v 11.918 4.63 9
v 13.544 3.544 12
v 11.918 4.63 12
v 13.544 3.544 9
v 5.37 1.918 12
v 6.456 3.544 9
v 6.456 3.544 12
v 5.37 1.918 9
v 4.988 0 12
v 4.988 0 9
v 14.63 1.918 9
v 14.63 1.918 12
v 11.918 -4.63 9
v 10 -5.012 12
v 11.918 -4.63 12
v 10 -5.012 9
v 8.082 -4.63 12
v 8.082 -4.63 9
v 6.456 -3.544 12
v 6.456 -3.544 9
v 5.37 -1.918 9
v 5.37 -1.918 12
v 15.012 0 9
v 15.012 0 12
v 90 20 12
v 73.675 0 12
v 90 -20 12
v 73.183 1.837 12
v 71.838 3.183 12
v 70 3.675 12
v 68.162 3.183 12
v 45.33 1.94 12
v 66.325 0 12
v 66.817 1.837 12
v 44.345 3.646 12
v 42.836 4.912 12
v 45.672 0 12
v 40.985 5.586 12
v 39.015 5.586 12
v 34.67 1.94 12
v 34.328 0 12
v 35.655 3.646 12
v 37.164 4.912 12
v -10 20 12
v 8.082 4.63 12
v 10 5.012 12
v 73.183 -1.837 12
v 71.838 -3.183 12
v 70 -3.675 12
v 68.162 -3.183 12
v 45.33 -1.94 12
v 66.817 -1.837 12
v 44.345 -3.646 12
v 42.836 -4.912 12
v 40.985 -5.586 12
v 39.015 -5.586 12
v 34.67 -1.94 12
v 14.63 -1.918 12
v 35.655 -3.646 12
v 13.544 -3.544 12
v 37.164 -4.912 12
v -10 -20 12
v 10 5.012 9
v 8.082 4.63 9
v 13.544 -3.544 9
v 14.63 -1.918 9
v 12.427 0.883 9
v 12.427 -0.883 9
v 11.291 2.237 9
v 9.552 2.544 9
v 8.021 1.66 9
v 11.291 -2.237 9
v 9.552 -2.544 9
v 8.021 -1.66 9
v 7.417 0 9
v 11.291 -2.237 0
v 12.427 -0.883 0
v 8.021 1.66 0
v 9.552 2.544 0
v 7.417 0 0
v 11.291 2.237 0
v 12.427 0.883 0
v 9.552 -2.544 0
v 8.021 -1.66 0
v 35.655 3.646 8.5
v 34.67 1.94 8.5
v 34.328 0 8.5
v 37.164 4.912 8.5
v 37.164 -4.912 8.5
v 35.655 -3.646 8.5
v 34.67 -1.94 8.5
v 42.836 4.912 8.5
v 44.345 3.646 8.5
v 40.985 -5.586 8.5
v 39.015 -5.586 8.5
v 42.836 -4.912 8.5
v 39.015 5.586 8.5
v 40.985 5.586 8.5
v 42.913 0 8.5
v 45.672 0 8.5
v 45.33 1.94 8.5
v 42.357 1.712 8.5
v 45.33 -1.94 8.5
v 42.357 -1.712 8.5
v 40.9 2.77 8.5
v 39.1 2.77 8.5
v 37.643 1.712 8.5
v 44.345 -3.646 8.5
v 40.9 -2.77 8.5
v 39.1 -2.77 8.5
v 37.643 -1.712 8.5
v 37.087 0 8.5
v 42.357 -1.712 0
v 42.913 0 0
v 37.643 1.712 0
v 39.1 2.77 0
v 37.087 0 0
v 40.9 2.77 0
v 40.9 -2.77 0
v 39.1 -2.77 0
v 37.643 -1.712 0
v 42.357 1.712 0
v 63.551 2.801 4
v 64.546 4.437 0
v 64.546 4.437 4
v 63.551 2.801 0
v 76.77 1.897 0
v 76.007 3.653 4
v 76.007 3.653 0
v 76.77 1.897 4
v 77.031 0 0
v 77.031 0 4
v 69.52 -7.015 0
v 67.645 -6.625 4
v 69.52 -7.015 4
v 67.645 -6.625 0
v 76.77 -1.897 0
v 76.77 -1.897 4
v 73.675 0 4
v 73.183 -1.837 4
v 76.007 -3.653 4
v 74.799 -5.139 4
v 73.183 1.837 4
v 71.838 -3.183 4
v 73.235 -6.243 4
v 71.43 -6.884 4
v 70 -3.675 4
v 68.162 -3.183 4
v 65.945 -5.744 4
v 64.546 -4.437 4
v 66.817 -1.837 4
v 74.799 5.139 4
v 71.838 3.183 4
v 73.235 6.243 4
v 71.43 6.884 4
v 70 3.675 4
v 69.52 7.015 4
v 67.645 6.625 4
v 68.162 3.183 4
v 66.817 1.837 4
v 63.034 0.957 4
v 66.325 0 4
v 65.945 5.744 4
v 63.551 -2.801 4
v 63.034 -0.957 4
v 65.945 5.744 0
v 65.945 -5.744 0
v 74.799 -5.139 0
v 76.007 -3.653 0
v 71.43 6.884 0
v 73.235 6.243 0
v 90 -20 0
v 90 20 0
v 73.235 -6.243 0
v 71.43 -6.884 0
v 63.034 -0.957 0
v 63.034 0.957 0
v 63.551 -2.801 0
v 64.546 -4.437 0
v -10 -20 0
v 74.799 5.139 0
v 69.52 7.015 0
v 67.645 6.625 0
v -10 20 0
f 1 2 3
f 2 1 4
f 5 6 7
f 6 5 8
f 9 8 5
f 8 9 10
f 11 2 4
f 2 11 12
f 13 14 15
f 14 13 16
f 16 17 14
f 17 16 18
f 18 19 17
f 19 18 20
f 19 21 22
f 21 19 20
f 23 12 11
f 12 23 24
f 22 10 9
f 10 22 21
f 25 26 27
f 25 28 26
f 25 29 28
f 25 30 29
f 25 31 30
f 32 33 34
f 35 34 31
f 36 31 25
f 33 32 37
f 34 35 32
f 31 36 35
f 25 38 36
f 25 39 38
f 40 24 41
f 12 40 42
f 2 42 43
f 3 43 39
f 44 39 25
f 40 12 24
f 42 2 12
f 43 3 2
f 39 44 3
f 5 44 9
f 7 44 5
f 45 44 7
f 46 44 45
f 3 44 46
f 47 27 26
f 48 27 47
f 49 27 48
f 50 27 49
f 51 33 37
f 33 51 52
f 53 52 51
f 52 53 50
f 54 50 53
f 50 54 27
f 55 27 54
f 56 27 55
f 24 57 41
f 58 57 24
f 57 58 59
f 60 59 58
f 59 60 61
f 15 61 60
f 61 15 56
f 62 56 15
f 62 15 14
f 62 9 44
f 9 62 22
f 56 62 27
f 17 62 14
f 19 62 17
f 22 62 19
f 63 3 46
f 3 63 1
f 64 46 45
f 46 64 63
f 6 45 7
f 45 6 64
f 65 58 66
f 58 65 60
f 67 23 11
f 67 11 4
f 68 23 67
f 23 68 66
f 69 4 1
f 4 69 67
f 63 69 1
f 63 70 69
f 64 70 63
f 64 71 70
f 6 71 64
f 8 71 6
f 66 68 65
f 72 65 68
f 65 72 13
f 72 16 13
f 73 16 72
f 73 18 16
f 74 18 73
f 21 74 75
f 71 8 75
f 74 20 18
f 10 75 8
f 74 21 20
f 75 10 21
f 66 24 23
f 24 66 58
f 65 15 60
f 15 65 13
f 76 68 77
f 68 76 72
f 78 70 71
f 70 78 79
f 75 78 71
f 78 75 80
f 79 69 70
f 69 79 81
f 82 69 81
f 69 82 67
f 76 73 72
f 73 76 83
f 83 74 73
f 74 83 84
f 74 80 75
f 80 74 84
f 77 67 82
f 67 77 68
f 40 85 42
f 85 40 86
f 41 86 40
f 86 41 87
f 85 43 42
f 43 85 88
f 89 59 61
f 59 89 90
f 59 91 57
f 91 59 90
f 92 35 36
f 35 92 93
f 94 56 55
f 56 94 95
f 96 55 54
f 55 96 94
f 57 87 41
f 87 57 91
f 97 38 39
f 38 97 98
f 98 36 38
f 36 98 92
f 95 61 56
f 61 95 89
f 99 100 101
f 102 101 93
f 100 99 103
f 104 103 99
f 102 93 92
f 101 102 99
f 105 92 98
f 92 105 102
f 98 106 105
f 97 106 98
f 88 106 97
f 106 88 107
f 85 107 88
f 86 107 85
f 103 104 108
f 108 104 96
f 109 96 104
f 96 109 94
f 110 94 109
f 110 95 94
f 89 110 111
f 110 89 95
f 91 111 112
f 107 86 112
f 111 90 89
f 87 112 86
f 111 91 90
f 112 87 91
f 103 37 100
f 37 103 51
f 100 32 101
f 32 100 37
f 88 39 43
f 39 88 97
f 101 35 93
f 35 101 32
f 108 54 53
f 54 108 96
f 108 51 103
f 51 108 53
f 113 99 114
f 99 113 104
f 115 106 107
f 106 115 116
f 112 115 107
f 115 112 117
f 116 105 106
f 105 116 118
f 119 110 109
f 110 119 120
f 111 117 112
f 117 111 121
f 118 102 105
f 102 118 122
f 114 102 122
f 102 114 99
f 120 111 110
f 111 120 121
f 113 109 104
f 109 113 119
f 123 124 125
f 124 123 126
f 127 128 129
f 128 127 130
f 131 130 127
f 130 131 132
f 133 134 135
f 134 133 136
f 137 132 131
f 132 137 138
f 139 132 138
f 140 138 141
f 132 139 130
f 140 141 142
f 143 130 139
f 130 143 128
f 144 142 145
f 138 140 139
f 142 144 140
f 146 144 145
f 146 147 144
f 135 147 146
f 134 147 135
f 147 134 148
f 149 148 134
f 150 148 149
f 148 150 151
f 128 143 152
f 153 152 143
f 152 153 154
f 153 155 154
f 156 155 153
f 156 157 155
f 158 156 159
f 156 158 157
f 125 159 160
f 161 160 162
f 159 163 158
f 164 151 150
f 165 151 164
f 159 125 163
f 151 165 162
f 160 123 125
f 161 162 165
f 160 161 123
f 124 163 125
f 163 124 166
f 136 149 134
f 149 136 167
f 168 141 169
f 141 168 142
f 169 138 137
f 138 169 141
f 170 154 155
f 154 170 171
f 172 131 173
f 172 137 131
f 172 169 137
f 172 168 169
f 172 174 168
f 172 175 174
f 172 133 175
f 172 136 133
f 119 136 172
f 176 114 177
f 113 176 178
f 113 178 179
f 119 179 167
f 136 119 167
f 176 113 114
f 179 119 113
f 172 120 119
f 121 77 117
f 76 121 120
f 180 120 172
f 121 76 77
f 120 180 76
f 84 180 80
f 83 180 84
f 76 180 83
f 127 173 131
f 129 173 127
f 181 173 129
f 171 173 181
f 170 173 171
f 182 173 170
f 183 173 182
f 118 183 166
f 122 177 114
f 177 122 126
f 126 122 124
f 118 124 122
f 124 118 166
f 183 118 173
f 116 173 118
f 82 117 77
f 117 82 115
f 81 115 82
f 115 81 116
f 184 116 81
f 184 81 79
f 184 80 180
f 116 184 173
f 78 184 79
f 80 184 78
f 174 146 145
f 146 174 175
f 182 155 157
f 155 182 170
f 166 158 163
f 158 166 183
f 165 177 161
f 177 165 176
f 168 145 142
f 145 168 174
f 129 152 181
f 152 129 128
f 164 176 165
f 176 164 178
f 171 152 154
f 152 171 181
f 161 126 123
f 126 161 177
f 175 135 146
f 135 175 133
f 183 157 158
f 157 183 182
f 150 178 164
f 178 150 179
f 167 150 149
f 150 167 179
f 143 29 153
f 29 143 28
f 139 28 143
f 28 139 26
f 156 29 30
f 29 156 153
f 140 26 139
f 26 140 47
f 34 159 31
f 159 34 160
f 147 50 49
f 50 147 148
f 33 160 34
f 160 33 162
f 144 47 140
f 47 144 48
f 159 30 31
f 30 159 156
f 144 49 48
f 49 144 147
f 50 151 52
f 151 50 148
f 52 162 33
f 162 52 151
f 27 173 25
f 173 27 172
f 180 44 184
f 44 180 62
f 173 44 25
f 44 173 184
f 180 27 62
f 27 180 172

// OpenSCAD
// =====================================================
// CALCULADORA DE AVELLANADO - TORNILLOS AMERICANOS
// (Flat Head Wood Screws, numeración ANSI/ASME B18.6.1)
// El diámetro de rosca se ingresa como N° de calibre
// USA (Wood Screw Gauge) o en pulgadas decimales
// Versión cilindro recto - DEMO 3D
// =====================================================
// NOTA: los tornillos de madera americanos se especifican
// por NÚMERO DE CALIBRE (#4, #6, #8, #10, #12) y no por
// diámetro directo como en métrico. A partir de 1/4" ya
// se especifican en pulgadas normales.
// Valores de cabeza (DK, K) tomados de tablas de referencia
// de flat head wood screws - verificar contra fabricante
// si es para producción crítica.
// =====================================================

PULGADA_AM = 25.4;
function pulg_a_mm_am(p) = p * PULGADA_AM;

// -----------------------------------------------------
// Diámetro de vástago (shank) según N° de calibre USA
// (en pulgadas decimales)
// -----------------------------------------------------
function diametro_calibre(numero) =
    numero == 2  ? 0.086 :
    numero == 3  ? 0.099 :
    numero == 4  ? 0.112 :
    numero == 5  ? 0.125 :
    numero == 6  ? 0.138 :
    numero == 7  ? 0.151 :
    numero == 8  ? 0.164 :
    numero == 9  ? 0.177 :
    numero == 10 ? 0.190 :
    numero == 12 ? 0.216 :
    numero == 14 ? 0.242 :
    0.190; // default: N°10

// -----------------------------------------------------
// Función que calcula [DK, K] en mm según el diámetro
// de rosca en PULGADAS decimales (shank diameter)
// Acepta tanto el resultado de diametro_calibre() como
// una pulgada normal (1/4", 5/16", 3/8") directamente
// -----------------------------------------------------
function cabeza_tornillo_americano(D_pulg) =
    D_pulg <= 0.086 ? [pulg_a_mm_am(0.216), pulg_a_mm_am(0.062)] : // N°2
    D_pulg <= 0.099 ? [pulg_a_mm_am(0.242), pulg_a_mm_am(0.070)] : // N°3
    D_pulg <= 0.112 ? [pulg_a_mm_am(0.268), pulg_a_mm_am(0.079)] : // N°4
    D_pulg <= 0.125 ? [pulg_a_mm_am(0.295), pulg_a_mm_am(0.088)] : // N°5
    D_pulg <= 0.138 ? [pulg_a_mm_am(0.320), pulg_a_mm_am(0.096)] : // N°6
    D_pulg <= 0.151 ? [pulg_a_mm_am(0.345), pulg_a_mm_am(0.104)] : // N°7
    D_pulg <= 0.164 ? [pulg_a_mm_am(0.371), pulg_a_mm_am(0.112)] : // N°8
    D_pulg <= 0.177 ? [pulg_a_mm_am(0.397), pulg_a_mm_am(0.120)] : // N°9
    D_pulg <= 0.190 ? [pulg_a_mm_am(0.423), pulg_a_mm_am(0.128)] : // N°10
    D_pulg <= 0.216 ? [pulg_a_mm_am(0.475), pulg_a_mm_am(0.144)] : // N°12
    D_pulg <= 0.242 ? [pulg_a_mm_am(0.507), pulg_a_mm_am(0.153)] : // N°14
    D_pulg <= 0.250 ? [pulg_a_mm_am(0.530), pulg_a_mm_am(0.160)] : // 1/4"
    D_pulg <= 0.3125? [pulg_a_mm_am(0.650), pulg_a_mm_am(0.195)] : // 5/16"
    D_pulg <= 0.375 ? [pulg_a_mm_am(0.770), pulg_a_mm_am(0.230)] : // 3/8"
    [pulg_a_mm_am(D_pulg) * 1.9, pulg_a_mm_am(D_pulg) * 0.55];     // fórmula general

// =====================================================
// MÓDULO SIMPLIFICADO - CILINDRO RECTO
// diametro_rosca_pulg: diámetro de vástago en pulgadas
// (usar diametro_calibre(N) para tornillos por número)
// =====================================================
module avellanado_cilindrico_americano(
    diametro_rosca_pulg,
    profundidad_avellano,
    holgura = 0.3
) {
    datos = cabeza_tornillo_americano(diametro_rosca_pulg);
    diametro_cabeza = datos[0];

    translate([0, 0, 0])
        cylinder(h = profundidad_avellano,
                 r = (diametro_cabeza/2) + holgura);
}

// =====================================================
// MÓDULO PARA AGUJERO PASANTE (solo diámetro)
// =====================================================
module agujero_pasante_americano(
    diametro_rosca_pulg,
    profundidad,
    profundidad_avellano = 0,
    holgura = 0.5,
    profundidad_abs = true
) {
    diametro_rosca_mm = pulg_a_mm_am(diametro_rosca_pulg);

    if (profundidad_abs)
        translate([0, 0, profundidad_avellano])
            cylinder(h = profundidad - profundidad_avellano,
                     r = (diametro_rosca_mm/2) + holgura);
    else
        translate([0, 0, profundidad_avellano])
            cylinder(h = profundidad,
                     r = (diametro_rosca_mm/2) + holgura);
}

// =====================================================
// MÓDULO COMBINADO - AVELLANADO + AGUJERO PASANTE
// =====================================================
module agujero_con_avellanado_americano(
    diametro_rosca_pulg,
    profundidad_avellano,
    profundidad_pieza,
    holgura_avellano = 0.3,
    holgura_pasante = 0.5,
    profundidad_abs = true
) {
    avellanado_cilindrico_americano(
        diametro_rosca_pulg = diametro_rosca_pulg,
        profundidad_avellano = profundidad_avellano,
        holgura = holgura_avellano
    );

    agujero_pasante_americano(
        diametro_rosca_pulg = diametro_rosca_pulg,
        profundidad = profundidad_pieza,
        profundidad_avellano = profundidad_avellano,
        holgura = holgura_pasante,
        profundidad_abs = profundidad_abs
    );
}

// Funciones de utilidad
function diametro_cabeza_americano(D_pulg) = cabeza_tornillo_americano(D_pulg)[0];
function altura_cabeza_americano(D_pulg) = cabeza_tornillo_americano(D_pulg)[1];

// =====================================================
// DEMO 3D: placa con 3 avellanados de distinto calibre
// margen de corte para evitar z-fighting en el booleano
// =====================================================
margen_corte_am = 0.5;
espesor_placa_am = 12;   // mm - grosor de la placa demo
ancho_placa_am   = 100;
largo_placa_am   = 40;

module placa_demo_americana() {
    difference() {
        // Placa base
        translate([-10, -largo_placa_am/2, 0])
            cube([ancho_placa_am, largo_placa_am, espesor_placa_am]);

        // Tornillo N°8, entra por la cara superior
        translate([10, 0, espesor_placa_am])
            rotate([0, 180, 0])
                agujero_con_avellanado_americano(
                    diametro_rosca_pulg = diametro_calibre(8),
                    profundidad_avellano = 3.0,
                    profundidad_pieza = espesor_placa_am + margen_corte_am
                );

        // Tornillo N°10, entra por la cara superior
        translate([40, 0, espesor_placa_am])
            rotate([0, 180, 0])
                agujero_con_avellanado_americano(
                    diametro_rosca_pulg = diametro_calibre(10),
                    profundidad_avellano = 3.5,
                    profundidad_pieza = espesor_placa_am + margen_corte_am
                );

        // Tornillo 1/4", entra por la cara inferior
        // (demuestra profundidad_abs = false)
        translate([70, 0, 0])
            agujero_con_avellanado_americano(
                diametro_rosca_pulg = 0.25,
                profundidad_avellano = 4.0,
                profundidad_pieza = espesor_placa_am + margen_corte_am,
                profundidad_abs = false
            );
    }
}

placa_demo_americana();
